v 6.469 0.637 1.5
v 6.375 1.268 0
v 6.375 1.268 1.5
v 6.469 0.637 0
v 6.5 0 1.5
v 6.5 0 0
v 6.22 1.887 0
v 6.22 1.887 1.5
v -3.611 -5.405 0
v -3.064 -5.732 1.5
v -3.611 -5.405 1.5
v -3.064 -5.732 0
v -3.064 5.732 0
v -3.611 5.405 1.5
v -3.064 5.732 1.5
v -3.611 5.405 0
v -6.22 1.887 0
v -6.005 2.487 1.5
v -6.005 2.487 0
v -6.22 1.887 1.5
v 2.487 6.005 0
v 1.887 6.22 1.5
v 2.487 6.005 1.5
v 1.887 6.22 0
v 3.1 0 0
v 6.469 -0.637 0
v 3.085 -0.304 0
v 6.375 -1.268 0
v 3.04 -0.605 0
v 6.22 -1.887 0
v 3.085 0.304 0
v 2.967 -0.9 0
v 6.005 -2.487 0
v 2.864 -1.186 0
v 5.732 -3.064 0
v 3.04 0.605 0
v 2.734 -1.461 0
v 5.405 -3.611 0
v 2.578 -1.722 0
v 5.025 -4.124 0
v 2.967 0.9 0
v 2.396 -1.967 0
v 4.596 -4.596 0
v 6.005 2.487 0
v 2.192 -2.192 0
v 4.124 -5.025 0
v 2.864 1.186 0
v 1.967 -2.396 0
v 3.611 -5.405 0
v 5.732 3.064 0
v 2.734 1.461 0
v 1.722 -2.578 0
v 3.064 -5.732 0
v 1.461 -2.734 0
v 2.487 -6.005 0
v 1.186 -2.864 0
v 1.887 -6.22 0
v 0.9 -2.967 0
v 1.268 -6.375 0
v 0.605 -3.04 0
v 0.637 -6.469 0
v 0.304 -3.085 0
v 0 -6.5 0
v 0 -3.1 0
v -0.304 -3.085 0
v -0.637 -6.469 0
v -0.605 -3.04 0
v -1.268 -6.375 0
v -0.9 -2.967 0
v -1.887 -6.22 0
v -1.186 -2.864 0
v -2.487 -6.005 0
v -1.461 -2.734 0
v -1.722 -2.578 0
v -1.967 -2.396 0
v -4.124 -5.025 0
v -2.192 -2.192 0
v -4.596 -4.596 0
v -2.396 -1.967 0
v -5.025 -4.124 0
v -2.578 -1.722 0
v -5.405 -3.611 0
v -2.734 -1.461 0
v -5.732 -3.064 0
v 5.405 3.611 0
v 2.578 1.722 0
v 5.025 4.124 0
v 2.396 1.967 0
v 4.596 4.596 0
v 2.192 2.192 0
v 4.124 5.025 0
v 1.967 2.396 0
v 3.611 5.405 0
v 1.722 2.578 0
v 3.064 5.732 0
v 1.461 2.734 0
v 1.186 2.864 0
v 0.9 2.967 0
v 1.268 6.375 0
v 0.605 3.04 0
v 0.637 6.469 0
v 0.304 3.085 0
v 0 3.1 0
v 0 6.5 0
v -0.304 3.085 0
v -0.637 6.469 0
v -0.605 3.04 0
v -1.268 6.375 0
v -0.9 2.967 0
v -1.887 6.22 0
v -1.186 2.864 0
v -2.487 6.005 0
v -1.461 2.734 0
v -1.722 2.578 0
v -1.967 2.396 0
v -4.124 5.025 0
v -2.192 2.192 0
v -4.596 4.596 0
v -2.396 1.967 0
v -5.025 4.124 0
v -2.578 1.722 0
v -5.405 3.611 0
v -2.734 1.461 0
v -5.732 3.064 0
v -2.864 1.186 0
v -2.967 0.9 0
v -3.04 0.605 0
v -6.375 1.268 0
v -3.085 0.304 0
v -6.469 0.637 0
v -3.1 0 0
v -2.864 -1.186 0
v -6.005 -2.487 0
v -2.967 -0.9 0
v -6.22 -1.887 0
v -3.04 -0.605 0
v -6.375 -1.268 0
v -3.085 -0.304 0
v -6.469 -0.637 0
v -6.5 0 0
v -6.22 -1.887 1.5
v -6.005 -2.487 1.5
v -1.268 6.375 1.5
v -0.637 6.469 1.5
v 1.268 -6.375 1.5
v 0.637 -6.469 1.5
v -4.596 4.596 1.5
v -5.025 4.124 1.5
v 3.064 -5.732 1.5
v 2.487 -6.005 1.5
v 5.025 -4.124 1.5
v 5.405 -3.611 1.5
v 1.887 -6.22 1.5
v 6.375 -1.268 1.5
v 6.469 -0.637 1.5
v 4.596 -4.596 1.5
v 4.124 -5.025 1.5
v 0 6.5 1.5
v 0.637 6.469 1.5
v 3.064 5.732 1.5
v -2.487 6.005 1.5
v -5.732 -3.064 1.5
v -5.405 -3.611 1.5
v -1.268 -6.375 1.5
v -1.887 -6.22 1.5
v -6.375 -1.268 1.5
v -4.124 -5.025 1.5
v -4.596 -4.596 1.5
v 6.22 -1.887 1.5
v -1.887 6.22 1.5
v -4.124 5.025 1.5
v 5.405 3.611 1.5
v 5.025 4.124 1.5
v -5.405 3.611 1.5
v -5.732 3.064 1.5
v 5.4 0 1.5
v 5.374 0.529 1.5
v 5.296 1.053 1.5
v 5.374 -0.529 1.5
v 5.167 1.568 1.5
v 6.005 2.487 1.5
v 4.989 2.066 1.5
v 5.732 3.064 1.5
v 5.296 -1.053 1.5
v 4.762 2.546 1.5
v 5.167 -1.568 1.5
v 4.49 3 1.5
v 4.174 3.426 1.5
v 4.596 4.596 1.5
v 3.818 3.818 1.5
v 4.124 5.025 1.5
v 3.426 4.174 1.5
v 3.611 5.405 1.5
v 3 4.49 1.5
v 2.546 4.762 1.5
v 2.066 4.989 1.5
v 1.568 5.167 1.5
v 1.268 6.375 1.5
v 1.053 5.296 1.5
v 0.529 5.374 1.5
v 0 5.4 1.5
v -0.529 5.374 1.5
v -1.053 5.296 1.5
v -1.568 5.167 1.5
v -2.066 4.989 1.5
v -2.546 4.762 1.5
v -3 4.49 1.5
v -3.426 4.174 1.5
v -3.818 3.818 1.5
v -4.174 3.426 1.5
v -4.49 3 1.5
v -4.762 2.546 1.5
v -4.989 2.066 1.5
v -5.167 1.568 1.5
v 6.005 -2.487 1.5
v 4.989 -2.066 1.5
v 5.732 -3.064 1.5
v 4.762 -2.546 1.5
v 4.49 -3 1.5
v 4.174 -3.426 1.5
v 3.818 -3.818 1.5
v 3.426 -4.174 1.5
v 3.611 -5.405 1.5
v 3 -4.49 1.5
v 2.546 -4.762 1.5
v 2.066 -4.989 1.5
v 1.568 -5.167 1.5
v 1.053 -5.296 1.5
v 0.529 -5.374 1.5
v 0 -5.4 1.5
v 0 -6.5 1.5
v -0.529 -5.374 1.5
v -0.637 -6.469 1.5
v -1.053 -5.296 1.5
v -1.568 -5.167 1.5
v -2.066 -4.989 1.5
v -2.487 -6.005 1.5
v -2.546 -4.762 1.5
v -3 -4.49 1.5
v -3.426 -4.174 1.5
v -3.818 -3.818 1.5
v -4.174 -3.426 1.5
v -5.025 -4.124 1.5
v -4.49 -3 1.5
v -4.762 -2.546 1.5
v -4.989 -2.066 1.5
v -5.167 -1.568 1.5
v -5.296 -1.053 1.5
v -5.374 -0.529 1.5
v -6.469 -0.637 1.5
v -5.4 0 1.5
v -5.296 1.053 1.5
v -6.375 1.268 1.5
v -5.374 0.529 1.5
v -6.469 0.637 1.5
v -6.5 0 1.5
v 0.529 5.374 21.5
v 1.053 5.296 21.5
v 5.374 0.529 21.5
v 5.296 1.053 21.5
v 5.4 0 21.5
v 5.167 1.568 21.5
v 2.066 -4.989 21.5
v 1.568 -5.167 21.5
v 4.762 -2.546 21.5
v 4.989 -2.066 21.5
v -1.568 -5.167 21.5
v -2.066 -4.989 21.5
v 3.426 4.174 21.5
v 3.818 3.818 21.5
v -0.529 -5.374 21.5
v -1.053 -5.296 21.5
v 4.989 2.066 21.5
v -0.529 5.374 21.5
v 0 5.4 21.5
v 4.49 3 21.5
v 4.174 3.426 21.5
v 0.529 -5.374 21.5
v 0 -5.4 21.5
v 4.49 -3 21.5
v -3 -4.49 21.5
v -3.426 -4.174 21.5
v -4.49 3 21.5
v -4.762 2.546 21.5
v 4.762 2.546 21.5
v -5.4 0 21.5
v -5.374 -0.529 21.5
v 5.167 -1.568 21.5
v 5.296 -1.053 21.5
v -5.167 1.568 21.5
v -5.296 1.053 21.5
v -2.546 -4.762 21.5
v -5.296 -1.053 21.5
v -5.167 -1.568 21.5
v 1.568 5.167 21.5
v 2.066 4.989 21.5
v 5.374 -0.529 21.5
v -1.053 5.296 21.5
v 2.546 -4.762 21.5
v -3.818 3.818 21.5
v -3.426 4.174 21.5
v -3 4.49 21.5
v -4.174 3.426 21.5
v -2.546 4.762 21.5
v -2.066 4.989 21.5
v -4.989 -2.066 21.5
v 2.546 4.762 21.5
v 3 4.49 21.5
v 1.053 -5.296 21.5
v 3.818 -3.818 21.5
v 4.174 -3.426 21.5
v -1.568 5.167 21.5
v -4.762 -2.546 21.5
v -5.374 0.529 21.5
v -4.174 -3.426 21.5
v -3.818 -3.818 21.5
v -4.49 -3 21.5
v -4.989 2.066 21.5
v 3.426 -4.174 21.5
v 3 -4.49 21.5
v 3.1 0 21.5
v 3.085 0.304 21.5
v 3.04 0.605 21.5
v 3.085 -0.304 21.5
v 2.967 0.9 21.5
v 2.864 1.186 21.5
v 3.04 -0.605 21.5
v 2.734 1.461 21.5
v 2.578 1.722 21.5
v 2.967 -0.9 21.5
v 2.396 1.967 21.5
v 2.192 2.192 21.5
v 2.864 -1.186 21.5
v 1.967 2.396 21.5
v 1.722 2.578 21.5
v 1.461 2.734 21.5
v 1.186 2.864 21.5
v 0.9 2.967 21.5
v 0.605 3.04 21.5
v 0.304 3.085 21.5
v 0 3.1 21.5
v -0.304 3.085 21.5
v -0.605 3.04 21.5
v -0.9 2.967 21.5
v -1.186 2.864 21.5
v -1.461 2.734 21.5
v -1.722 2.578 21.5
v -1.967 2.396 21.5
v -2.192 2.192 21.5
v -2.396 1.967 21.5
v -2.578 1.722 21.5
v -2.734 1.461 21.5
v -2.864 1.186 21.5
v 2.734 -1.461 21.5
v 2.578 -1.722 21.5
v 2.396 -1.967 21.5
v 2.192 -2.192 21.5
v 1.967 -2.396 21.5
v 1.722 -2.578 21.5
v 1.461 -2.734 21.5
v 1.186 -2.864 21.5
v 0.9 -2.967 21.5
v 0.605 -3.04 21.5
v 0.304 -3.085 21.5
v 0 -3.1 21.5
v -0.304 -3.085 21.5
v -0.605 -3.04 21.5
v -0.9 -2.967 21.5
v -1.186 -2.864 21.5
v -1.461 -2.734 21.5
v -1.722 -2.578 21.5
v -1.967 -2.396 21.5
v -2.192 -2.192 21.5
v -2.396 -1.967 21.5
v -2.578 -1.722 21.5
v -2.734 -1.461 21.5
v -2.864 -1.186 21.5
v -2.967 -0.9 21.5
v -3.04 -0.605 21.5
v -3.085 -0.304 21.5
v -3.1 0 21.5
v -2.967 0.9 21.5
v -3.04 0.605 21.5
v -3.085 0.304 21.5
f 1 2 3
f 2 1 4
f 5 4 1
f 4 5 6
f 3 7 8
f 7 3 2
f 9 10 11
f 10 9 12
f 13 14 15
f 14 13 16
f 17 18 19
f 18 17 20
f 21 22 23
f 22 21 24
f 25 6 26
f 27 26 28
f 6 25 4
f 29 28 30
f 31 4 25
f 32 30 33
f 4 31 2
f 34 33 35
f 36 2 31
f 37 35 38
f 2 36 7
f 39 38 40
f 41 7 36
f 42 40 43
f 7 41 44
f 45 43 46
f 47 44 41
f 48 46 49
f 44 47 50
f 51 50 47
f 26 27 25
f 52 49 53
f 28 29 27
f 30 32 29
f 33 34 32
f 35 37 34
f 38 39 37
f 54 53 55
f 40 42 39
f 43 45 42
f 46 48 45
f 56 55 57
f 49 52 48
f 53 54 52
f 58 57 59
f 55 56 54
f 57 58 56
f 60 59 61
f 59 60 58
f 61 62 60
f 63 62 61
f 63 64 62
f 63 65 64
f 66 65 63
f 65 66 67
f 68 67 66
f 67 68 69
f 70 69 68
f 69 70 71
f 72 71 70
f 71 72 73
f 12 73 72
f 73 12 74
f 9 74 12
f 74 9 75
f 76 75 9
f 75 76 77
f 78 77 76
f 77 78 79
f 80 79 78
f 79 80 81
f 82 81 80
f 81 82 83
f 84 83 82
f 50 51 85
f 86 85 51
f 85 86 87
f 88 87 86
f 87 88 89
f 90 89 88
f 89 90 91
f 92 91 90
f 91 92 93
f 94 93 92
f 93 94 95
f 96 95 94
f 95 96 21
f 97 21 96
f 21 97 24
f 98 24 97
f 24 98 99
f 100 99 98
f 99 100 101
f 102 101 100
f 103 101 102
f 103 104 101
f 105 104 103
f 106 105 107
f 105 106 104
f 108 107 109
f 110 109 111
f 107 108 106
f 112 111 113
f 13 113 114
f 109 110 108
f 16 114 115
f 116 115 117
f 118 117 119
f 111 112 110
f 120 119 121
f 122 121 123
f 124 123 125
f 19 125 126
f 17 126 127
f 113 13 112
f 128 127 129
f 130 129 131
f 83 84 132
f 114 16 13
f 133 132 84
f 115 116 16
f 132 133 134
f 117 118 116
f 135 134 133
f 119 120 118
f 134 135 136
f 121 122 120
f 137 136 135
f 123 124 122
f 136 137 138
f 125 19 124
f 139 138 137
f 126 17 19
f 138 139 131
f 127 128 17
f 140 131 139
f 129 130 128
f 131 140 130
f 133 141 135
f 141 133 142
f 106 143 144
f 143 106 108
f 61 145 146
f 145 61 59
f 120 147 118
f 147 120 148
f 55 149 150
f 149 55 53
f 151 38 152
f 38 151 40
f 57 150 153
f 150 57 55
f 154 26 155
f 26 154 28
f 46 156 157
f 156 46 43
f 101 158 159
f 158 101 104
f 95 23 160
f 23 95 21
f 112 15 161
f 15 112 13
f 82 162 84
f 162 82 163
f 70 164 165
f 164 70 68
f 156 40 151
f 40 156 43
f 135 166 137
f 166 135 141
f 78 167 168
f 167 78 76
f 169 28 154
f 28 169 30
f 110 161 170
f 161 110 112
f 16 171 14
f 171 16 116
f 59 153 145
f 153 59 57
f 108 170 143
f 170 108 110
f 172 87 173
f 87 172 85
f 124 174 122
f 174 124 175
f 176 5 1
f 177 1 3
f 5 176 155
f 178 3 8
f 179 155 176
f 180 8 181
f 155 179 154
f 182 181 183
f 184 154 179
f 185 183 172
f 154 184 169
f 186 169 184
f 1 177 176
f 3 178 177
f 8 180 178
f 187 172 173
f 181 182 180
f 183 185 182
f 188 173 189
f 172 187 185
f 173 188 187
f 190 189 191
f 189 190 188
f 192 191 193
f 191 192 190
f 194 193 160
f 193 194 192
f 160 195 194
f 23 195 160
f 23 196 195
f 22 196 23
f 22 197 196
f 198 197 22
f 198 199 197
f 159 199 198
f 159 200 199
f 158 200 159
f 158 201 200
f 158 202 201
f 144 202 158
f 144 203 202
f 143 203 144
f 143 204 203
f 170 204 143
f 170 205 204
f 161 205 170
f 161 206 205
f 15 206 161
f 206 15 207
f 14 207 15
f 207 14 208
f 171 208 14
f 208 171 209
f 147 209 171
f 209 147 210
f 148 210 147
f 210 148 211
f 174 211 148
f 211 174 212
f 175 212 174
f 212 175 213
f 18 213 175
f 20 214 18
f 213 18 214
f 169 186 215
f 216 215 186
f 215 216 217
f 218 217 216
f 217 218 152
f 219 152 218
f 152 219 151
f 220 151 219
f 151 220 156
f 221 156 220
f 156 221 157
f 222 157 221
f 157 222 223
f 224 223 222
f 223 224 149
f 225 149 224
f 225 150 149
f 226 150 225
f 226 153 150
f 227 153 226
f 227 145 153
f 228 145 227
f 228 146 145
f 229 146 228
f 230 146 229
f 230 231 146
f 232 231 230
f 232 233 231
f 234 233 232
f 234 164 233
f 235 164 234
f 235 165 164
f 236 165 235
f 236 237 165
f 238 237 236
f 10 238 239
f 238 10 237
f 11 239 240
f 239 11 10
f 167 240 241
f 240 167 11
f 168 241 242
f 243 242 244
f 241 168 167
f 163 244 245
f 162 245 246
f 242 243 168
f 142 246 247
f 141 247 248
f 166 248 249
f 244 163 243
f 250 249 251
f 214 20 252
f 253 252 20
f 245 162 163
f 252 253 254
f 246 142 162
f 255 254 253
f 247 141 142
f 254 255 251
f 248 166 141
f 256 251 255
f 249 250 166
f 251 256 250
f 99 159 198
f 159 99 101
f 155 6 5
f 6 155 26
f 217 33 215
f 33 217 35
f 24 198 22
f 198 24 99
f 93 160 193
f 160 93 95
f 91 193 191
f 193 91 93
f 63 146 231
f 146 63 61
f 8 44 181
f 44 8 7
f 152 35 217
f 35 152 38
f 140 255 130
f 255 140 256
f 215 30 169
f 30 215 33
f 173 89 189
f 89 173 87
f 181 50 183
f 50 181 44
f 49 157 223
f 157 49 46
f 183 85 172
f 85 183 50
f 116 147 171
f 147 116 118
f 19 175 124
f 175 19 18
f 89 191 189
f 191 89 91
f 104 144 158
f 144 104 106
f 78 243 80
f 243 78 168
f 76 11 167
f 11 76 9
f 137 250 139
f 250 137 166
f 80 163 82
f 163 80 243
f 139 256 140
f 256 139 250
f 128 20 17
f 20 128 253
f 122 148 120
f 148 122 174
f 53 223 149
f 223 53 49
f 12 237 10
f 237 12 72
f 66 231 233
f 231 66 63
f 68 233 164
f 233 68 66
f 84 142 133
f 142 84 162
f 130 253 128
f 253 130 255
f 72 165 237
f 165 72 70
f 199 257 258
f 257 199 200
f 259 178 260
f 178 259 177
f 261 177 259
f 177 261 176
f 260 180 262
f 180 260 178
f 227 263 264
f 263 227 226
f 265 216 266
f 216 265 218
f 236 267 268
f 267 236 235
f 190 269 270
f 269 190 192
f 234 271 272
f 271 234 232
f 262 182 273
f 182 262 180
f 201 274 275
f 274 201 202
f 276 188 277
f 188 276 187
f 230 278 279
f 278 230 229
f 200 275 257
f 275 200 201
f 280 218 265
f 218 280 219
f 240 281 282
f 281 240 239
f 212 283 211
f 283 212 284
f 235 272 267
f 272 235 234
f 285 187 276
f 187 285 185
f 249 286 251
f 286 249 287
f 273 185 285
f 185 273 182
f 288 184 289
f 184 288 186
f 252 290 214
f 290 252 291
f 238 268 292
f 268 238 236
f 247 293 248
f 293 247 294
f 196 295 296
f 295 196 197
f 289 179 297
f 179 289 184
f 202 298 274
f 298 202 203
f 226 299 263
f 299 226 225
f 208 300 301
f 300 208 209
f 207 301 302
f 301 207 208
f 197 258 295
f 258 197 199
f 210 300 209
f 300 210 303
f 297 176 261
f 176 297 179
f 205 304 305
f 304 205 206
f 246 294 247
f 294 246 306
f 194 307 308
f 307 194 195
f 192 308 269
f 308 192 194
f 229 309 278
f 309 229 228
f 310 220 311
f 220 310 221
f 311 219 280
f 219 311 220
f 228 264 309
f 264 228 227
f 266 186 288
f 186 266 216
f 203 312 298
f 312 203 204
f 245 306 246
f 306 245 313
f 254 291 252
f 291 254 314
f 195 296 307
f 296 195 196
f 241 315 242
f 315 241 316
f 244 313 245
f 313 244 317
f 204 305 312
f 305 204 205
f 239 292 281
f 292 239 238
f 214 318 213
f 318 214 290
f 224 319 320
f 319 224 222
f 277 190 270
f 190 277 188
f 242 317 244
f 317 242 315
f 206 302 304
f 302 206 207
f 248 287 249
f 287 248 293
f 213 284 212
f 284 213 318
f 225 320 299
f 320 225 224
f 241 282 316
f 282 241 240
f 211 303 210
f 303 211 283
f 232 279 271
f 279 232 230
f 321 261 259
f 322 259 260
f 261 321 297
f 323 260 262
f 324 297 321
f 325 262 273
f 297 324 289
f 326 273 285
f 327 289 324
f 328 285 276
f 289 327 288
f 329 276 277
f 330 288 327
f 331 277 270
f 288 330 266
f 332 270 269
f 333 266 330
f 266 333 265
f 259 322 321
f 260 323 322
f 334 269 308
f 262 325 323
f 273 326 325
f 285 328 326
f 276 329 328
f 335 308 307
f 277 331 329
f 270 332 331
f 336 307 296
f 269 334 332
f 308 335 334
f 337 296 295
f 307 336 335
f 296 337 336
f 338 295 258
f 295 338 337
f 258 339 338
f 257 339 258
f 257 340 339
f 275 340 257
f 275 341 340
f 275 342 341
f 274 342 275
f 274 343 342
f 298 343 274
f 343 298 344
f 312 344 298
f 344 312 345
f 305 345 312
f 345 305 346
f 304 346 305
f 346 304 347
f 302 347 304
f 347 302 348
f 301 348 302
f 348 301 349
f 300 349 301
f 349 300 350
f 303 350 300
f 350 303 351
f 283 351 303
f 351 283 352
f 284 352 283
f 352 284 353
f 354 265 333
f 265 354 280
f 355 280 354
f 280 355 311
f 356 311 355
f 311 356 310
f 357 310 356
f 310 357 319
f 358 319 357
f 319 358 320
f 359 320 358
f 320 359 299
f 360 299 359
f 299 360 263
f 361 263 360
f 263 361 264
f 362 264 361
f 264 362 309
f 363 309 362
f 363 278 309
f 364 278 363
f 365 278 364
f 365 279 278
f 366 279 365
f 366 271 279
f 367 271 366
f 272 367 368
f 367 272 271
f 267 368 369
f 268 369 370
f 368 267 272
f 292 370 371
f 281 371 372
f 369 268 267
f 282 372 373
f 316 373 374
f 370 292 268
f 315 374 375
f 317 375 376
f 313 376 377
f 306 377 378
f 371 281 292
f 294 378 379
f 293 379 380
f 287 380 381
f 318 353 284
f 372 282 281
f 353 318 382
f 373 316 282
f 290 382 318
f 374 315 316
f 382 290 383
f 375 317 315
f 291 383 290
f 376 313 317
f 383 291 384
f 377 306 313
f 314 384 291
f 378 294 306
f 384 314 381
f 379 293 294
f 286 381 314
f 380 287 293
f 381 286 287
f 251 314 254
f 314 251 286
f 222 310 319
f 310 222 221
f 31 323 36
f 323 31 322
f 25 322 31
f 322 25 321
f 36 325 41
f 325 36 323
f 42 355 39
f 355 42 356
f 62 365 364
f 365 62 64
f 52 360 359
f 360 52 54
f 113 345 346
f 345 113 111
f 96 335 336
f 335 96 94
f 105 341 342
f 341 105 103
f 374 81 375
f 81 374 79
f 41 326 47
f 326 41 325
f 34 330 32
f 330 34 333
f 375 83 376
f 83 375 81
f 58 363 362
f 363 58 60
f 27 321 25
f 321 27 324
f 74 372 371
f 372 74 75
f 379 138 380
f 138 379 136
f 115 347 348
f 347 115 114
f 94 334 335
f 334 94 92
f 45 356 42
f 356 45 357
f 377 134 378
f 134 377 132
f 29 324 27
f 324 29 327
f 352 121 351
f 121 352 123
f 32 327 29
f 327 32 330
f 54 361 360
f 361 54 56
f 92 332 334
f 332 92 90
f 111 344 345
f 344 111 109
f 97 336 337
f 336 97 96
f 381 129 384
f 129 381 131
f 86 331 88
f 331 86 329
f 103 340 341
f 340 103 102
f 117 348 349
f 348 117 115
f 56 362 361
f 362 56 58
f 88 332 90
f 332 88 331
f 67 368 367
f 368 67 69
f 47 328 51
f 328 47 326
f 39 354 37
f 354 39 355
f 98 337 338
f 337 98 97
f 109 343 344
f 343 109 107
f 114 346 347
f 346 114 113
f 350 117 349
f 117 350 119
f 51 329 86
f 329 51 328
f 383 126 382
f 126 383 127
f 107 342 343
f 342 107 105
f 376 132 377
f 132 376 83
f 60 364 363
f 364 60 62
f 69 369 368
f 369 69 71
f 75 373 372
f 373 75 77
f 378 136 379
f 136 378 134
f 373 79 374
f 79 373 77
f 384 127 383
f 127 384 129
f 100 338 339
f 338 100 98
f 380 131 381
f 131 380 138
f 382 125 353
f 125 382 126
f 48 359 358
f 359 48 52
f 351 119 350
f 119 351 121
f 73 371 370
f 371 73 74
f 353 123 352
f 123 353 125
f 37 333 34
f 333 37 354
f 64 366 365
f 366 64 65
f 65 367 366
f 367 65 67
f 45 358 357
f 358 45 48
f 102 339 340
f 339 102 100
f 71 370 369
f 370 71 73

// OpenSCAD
// Adapter sleeve: 0.2 mL PCR tube in a 1.5 mL rack hole
// Print orientation: collar down on the bed (z = 0), sleeve up to z = 21.5

$fn = 64;

// ---- Dimensions (mm) ----
collar_d      = 13;    // collar diameter (contact with bed)
collar_h      = 1.5;   // collar thickness
sleeve_od     = 10.8;  // sleeve outer diameter
sleeve_top_z  = 21.5;  // top of sleeve (rack hole depth)
bore_d        = 6.2;   // through-bore diameter
eps           = 0.5;   // cutter overshoot past faces

// ---- Model ----
difference() {
    union() {
        // Collar
        cylinder(d = collar_d, h = collar_h);
        // Sleeve body (overlaps collar slightly for a clean union)
        translate([0, 0, collar_h - 0.01])
            cylinder(d = sleeve_od, h = sleeve_top_z - collar_h + 0.01);
    }
    // Full-height bore, open at both ends
    translate([0, 0, -eps])
        cylinder(d = bore_d, h = sleeve_top_z + 2 * eps);
}
